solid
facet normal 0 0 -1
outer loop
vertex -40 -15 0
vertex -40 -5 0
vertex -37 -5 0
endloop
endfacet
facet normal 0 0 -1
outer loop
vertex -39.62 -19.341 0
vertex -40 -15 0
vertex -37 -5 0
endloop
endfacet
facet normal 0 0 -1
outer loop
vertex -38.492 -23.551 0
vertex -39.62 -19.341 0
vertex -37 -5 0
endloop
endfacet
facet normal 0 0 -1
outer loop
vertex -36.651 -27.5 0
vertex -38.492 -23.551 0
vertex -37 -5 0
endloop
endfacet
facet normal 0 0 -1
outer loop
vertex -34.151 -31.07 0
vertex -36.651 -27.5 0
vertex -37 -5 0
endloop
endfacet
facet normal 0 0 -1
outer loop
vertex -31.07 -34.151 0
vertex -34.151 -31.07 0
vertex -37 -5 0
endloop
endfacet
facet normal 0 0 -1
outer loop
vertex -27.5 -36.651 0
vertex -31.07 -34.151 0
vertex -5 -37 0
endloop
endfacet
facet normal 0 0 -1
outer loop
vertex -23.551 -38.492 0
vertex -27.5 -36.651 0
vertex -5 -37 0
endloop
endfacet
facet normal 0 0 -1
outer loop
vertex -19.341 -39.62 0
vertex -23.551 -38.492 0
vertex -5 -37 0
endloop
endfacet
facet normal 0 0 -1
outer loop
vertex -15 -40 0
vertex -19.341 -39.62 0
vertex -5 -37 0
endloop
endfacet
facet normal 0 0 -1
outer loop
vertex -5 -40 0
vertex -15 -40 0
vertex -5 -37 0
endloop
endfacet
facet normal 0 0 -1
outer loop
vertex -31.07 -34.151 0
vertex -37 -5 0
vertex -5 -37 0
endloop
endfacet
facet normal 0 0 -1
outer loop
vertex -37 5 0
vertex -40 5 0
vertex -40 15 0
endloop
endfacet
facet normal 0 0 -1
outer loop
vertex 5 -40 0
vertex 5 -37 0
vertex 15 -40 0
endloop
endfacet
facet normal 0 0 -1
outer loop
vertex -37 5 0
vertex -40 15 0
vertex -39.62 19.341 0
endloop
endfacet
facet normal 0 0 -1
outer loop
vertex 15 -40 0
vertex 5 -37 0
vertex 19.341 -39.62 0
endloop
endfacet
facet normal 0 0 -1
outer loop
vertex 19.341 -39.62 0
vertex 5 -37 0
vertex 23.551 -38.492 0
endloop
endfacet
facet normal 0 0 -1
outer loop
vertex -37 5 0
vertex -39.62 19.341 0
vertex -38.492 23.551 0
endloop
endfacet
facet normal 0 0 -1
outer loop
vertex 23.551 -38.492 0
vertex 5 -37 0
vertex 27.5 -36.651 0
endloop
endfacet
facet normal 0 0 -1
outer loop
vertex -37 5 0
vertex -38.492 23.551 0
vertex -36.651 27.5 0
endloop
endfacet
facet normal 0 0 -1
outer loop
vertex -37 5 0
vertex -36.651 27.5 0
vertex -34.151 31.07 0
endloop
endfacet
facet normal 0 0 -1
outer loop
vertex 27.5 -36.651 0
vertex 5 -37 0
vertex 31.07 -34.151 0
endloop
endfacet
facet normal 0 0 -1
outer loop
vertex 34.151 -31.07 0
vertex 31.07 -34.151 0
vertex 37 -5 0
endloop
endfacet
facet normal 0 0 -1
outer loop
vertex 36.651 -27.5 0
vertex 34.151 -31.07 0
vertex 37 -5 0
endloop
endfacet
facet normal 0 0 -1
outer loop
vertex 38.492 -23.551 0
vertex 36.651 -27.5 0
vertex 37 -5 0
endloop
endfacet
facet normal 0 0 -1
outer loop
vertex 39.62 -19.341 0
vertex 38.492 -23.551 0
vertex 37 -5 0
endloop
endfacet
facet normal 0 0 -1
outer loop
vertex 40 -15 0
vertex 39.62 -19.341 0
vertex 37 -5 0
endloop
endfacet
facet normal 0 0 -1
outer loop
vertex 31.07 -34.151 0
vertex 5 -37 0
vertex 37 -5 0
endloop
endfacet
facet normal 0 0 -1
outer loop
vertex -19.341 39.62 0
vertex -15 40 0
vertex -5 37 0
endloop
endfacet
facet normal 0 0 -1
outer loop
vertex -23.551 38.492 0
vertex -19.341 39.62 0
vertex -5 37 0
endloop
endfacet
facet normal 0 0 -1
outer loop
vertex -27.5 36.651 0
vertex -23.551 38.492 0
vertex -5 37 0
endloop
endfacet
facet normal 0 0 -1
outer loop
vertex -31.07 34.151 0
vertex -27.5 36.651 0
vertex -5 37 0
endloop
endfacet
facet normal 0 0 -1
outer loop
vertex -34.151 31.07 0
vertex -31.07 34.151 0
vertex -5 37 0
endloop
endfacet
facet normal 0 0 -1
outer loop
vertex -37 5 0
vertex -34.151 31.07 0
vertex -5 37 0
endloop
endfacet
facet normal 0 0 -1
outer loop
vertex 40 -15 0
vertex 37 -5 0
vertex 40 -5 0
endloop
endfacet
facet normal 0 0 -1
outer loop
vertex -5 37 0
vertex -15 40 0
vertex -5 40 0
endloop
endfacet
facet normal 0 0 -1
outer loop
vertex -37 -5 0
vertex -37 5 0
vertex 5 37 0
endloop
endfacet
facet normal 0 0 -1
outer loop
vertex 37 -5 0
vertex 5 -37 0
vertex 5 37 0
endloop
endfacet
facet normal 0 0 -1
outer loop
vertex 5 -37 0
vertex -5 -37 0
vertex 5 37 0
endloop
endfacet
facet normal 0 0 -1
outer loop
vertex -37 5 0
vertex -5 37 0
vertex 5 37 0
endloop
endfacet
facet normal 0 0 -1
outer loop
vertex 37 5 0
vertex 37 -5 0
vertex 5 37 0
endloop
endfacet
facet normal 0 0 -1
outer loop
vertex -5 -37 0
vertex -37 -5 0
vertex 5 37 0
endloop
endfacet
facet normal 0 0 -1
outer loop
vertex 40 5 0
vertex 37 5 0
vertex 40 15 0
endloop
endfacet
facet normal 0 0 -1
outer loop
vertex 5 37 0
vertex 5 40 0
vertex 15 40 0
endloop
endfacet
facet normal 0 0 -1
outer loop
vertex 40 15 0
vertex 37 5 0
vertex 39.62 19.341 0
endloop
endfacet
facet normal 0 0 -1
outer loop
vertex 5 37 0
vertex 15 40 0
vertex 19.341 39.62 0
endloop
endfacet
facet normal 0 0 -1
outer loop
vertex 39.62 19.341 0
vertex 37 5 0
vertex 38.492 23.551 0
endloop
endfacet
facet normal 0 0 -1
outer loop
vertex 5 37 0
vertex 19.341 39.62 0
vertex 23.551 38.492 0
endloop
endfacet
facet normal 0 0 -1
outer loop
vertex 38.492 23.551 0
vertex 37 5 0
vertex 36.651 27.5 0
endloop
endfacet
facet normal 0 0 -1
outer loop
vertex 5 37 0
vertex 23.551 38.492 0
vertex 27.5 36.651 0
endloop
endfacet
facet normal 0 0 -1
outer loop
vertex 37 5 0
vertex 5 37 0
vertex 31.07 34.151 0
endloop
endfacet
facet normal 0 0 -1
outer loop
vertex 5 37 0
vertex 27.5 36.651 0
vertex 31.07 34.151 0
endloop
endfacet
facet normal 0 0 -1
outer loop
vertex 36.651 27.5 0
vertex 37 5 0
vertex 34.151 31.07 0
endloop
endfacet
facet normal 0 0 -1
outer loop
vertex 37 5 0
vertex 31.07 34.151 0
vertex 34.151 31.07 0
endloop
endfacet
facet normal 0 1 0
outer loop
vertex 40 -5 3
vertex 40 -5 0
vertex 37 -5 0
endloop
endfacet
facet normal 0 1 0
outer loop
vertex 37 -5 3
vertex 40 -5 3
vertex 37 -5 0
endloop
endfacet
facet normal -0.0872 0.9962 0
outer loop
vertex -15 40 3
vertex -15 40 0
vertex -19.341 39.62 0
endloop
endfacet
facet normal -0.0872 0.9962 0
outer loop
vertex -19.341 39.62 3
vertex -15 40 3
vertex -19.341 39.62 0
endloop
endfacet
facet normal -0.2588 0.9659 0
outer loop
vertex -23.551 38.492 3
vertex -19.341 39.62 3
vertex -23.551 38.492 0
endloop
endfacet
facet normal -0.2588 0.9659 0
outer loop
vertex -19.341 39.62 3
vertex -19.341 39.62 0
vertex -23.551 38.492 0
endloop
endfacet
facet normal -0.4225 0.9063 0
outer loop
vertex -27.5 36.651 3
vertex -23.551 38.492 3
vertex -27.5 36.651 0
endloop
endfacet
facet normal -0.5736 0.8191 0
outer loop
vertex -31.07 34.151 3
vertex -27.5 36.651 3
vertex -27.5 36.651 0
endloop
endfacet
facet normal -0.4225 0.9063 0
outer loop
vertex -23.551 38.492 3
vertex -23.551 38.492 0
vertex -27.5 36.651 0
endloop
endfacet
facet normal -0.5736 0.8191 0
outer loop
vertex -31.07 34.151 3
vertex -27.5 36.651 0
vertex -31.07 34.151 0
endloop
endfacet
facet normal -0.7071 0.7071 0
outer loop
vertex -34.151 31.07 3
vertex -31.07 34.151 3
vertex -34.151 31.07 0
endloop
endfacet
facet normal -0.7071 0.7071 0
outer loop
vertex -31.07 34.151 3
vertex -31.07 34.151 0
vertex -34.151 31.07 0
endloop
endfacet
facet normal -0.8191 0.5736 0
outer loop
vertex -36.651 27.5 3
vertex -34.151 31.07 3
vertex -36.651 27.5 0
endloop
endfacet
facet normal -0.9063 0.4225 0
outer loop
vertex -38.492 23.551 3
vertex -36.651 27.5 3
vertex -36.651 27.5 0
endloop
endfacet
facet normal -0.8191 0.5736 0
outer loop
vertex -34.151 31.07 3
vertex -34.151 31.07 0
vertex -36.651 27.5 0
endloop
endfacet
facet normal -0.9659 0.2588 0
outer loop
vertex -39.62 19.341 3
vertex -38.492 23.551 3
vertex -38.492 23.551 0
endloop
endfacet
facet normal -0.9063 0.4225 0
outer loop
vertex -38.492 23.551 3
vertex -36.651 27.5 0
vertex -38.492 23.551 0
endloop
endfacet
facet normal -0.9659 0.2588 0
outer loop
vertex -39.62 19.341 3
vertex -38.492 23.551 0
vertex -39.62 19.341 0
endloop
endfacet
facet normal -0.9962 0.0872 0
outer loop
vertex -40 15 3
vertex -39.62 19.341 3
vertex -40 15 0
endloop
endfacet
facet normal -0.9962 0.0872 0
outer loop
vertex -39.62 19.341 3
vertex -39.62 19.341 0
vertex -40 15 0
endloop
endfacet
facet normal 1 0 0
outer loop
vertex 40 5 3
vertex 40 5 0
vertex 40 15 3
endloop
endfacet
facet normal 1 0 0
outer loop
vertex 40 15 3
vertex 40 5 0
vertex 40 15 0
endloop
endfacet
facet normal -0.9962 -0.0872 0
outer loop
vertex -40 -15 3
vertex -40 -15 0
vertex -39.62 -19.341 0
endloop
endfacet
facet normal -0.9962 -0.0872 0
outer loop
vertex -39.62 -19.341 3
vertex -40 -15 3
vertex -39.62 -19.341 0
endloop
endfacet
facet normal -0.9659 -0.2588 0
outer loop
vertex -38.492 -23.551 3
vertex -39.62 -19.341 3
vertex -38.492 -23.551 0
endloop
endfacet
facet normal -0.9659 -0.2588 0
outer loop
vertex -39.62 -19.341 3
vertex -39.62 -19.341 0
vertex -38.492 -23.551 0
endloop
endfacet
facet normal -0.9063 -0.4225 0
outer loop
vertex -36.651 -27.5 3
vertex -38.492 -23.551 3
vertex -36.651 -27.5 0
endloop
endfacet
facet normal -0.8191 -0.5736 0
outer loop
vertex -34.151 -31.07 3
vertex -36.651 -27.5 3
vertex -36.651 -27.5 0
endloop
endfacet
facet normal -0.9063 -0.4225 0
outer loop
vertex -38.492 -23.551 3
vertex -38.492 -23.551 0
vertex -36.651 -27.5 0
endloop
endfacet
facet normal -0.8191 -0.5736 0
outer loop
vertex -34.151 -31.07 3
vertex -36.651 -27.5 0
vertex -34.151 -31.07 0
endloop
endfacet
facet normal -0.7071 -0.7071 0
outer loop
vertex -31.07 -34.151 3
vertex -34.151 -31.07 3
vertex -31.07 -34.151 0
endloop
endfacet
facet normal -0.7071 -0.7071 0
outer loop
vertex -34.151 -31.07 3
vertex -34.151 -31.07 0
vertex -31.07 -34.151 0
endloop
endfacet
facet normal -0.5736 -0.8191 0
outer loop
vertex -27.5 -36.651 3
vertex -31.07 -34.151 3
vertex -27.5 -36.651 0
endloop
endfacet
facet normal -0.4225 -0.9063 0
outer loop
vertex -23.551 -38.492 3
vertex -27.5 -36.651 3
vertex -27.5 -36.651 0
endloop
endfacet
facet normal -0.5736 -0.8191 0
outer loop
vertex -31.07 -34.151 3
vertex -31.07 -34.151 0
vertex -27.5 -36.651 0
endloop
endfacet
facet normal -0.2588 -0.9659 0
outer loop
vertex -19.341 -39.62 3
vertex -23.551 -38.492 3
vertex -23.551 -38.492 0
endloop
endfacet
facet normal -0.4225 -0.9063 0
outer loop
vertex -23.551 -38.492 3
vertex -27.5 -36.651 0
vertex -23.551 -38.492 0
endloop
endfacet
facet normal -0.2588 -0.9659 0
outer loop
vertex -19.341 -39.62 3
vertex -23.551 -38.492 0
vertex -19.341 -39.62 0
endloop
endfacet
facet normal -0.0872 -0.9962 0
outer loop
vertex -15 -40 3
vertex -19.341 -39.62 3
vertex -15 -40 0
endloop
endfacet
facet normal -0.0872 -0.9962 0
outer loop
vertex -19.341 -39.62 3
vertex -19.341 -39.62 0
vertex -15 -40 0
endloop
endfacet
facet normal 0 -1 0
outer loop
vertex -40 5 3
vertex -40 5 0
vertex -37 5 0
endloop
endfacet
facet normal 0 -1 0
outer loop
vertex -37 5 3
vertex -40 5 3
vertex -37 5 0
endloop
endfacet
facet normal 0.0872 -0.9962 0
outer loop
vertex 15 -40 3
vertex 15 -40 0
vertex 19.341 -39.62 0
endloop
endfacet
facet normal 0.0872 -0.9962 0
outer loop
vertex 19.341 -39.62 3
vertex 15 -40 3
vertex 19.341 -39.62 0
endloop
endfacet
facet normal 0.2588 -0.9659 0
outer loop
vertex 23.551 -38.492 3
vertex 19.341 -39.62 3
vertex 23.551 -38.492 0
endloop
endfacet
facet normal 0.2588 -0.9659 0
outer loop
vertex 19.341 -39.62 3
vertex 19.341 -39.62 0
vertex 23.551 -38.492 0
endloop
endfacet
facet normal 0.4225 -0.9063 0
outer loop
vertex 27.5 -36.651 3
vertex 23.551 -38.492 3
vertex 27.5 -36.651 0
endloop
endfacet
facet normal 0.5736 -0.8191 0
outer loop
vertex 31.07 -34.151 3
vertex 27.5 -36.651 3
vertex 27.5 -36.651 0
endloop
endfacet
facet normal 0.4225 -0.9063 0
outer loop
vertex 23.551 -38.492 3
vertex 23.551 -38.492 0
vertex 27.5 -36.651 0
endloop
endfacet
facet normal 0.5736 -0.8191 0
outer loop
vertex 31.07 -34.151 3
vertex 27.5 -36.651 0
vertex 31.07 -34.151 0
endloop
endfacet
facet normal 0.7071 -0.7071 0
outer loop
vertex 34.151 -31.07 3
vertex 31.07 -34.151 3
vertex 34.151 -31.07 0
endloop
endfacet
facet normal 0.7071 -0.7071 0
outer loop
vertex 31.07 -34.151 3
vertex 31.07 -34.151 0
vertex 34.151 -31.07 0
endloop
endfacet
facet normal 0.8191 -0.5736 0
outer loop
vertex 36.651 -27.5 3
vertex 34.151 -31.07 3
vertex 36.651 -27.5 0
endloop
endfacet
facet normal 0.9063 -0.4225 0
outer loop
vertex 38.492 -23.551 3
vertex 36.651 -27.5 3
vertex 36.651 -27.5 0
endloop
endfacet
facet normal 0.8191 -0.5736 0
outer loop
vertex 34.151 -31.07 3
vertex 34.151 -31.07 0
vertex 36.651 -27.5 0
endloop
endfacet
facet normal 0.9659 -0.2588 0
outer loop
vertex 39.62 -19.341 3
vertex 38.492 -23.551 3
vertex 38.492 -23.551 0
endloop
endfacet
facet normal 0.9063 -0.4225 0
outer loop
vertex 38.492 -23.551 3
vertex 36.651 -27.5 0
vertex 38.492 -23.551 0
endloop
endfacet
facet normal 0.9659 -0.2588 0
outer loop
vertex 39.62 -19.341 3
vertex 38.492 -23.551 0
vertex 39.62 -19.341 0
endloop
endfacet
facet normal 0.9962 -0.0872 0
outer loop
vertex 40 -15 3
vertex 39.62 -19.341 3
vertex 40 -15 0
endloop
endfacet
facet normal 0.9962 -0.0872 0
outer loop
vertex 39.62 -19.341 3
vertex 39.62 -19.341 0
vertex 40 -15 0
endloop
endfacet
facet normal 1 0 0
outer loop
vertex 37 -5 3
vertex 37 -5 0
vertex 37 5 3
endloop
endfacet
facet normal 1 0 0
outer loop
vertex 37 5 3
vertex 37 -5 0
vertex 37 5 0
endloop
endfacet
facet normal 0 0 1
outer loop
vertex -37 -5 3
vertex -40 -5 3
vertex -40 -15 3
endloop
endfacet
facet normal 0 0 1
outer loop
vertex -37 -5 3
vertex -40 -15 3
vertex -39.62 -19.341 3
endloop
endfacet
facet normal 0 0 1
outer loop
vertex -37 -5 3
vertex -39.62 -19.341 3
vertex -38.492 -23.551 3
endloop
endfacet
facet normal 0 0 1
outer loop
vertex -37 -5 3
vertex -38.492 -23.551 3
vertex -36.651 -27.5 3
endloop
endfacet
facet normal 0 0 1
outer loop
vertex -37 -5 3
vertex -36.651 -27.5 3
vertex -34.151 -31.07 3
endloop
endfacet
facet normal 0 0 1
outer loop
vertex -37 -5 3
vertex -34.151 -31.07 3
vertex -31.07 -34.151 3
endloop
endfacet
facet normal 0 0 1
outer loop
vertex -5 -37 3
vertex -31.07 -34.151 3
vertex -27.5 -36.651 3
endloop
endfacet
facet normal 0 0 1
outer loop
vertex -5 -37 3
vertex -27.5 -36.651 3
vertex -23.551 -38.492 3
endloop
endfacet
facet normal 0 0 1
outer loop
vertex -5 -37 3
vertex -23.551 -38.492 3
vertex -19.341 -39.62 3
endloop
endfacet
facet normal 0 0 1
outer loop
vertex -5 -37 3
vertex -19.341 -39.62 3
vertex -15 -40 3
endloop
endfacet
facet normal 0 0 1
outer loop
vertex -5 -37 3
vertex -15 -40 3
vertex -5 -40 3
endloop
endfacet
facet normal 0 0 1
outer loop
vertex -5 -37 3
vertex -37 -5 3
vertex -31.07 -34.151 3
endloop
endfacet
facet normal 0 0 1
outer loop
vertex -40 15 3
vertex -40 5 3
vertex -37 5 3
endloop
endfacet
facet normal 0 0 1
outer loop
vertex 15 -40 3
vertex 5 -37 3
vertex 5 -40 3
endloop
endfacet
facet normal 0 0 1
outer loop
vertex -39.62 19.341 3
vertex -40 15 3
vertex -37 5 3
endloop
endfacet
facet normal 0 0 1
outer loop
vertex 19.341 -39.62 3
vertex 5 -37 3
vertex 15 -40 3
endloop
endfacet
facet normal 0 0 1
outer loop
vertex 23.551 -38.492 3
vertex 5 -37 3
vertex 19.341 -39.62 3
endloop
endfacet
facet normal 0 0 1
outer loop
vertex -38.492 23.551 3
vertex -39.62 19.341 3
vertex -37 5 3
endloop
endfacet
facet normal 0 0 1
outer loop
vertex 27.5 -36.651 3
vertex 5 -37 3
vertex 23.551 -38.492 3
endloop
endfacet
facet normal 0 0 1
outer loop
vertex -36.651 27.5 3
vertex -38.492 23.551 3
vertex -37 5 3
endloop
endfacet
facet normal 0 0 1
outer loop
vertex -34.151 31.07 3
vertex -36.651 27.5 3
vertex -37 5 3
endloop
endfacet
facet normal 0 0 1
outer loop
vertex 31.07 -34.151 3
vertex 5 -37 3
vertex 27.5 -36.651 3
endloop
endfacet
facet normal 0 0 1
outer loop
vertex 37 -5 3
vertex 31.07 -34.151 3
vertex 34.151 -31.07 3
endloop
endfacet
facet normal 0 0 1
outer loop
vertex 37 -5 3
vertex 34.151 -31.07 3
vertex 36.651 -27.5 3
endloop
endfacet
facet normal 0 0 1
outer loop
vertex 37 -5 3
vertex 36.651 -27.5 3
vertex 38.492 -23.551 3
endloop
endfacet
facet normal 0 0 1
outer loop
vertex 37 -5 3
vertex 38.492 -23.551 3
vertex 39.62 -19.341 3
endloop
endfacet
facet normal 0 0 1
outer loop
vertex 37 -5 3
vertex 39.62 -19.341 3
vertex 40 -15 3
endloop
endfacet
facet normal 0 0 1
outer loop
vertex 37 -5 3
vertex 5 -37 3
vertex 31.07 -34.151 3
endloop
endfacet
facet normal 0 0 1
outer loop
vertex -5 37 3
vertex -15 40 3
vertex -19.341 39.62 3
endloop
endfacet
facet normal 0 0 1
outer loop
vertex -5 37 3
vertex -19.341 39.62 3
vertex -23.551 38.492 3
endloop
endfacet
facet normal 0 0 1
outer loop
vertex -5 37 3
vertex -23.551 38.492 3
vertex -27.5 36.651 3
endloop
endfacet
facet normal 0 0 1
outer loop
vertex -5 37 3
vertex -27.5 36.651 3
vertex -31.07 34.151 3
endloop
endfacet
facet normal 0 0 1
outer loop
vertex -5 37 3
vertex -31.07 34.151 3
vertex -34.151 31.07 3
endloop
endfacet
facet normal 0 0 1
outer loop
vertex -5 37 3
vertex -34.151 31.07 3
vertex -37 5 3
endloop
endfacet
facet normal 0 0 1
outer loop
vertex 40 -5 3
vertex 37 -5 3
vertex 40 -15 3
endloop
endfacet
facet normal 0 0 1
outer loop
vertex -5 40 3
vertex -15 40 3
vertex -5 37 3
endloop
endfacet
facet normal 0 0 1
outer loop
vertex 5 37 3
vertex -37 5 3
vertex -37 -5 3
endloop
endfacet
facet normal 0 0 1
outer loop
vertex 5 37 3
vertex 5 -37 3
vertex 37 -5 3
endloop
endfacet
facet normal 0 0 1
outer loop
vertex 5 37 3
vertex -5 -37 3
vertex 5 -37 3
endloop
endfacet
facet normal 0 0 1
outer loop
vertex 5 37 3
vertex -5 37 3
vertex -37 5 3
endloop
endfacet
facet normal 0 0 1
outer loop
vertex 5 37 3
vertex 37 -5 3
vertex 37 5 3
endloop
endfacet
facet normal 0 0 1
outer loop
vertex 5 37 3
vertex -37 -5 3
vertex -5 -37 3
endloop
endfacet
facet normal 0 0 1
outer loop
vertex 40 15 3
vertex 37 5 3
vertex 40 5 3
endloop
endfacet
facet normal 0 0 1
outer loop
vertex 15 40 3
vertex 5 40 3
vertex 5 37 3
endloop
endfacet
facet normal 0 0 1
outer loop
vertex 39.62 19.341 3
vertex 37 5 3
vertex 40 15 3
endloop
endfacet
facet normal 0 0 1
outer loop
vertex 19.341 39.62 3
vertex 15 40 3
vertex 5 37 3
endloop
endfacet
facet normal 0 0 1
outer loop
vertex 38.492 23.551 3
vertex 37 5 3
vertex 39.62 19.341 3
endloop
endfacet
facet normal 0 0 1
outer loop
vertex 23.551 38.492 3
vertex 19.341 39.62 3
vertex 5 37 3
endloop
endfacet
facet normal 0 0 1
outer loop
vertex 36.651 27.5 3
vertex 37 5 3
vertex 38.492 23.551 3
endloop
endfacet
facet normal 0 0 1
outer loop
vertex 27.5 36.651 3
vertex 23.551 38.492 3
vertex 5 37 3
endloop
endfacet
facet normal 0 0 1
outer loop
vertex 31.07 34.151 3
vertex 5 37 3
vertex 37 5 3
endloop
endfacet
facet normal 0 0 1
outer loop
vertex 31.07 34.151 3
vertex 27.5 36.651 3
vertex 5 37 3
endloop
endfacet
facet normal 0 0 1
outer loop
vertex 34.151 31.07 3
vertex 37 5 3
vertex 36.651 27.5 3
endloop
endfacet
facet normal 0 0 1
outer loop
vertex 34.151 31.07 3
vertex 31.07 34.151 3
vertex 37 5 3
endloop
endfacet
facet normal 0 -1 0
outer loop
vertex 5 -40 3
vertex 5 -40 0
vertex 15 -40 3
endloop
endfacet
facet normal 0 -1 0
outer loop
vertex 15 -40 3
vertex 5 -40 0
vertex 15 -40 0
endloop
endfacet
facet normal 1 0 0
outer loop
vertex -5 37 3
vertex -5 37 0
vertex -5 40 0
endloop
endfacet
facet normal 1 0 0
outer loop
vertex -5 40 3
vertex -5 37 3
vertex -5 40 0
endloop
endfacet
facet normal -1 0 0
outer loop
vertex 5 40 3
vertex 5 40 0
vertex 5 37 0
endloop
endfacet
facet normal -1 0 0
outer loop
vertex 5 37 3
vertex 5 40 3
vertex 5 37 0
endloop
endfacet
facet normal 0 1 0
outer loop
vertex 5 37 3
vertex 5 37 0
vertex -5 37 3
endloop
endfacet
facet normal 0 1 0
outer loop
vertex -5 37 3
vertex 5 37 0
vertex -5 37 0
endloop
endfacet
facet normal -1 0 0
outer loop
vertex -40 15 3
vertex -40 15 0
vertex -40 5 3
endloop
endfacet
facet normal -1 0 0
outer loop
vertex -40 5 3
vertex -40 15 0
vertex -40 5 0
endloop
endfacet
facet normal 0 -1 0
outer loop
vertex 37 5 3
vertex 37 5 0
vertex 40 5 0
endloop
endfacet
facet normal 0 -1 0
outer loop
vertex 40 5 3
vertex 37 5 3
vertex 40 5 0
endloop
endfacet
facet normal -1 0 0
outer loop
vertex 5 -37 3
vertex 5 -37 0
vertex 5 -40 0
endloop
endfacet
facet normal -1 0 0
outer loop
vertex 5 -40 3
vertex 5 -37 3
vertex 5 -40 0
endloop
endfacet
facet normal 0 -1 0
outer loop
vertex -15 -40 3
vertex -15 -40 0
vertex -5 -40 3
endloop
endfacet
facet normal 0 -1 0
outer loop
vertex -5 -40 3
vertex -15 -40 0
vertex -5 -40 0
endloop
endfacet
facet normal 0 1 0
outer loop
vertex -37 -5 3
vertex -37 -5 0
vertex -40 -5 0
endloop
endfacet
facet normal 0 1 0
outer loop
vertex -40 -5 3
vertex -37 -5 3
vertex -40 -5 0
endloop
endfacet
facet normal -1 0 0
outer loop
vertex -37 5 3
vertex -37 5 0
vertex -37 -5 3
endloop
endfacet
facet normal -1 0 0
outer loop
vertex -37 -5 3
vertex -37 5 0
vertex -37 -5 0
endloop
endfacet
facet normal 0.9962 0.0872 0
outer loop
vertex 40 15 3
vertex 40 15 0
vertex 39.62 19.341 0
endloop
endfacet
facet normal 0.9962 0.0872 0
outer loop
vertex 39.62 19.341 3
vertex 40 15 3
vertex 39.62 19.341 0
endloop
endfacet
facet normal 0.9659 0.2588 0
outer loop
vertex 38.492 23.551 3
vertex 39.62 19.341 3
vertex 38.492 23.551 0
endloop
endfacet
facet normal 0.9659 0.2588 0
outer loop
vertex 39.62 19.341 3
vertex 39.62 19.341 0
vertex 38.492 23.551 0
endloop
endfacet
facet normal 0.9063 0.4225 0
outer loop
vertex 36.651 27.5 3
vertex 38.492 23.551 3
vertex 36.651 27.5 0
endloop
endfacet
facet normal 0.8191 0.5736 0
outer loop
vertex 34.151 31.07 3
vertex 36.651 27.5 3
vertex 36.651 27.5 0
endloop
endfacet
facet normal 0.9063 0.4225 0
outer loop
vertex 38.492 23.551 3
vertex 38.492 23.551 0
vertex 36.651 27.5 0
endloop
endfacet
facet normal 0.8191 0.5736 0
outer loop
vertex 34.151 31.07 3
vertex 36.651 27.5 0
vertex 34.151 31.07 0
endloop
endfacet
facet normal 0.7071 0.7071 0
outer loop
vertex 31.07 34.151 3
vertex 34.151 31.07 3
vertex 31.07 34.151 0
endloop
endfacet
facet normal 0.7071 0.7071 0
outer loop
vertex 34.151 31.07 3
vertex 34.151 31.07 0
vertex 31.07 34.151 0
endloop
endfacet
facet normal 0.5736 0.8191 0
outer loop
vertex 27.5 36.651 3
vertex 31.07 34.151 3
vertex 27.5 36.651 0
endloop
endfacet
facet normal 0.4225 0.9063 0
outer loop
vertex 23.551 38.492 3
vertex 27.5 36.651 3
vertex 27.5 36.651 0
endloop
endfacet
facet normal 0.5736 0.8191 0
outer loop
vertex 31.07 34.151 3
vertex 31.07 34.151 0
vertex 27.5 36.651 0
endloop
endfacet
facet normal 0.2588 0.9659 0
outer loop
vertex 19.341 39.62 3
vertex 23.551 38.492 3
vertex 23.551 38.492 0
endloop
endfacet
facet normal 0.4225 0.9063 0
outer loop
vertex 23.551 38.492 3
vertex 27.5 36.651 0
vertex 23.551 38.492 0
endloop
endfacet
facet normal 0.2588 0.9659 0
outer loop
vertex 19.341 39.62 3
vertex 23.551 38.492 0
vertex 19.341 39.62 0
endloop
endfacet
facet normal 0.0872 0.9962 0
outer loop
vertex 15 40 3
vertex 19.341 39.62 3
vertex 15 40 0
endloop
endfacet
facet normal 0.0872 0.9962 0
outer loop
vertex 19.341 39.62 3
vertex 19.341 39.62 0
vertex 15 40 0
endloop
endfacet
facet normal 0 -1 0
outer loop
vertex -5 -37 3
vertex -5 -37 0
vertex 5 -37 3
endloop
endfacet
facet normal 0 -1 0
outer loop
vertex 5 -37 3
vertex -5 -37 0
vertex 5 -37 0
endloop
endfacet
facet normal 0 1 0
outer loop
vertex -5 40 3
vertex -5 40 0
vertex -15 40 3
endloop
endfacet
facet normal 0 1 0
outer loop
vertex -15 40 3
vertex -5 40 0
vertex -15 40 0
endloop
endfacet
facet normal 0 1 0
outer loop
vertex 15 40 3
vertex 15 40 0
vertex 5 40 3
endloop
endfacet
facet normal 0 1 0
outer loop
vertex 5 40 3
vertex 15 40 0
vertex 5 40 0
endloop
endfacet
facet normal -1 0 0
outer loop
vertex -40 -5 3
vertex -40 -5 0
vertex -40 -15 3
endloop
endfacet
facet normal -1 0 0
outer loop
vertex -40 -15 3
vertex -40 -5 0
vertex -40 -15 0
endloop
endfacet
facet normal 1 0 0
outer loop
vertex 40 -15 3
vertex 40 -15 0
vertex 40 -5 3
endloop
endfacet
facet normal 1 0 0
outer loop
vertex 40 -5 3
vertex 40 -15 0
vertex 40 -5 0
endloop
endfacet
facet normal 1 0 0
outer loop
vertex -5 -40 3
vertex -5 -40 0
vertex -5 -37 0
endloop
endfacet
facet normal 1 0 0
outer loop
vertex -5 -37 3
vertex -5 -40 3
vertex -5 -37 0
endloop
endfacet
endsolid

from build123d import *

# Parameters (mm, degrees)
EXTRUDE_1_DEPTH = 3


with BuildPart() as part:
    # 草圖1 → 填料-伸長1 (new body)
    with BuildSketch(Plane.XY):
        with BuildLine():
            Line((-5, 40), (-15, 40))
            ThreePointArc((-15, 40), (-32.67766953, 32.67766953), (-40, 15))
            Line((-40, 15), (-40, 5))
            Line((-40, 5), (-37, 5))
            Line((-37, 5), (-37, -5))
            Line((-37, -5), (-40, -5))
            Line((-40, -5), (-40, -15))
            ThreePointArc((-40, -15), (-32.67766953, -32.67766953), (-15, -40))
            Line((-15, -40), (-5, -40))
            Line((-5, -40), (-5, -37))
            Line((-5, -37), (5, -37))
            Line((5, -37), (5, -40))
            Line((5, -40), (15, -40))
            ThreePointArc((15, -40), (32.67766953, -32.67766953), (40, -15))
            Line((40, -15), (40, -5))
            Line((40, -5), (37, -5))
            Line((37, -5), (37, 5))
            Line((37, 5), (40, 5))
            Line((40, 5), (40, 15))
            ThreePointArc((40, 15), (32.67766953, 32.67766953), (15, 40))
            Line((15, 40), (5, 40))
            Line((5, 40), (5, 37))
            Line((5, 37), (-5, 37))
            Line((-5, 37), (-5, 40))
        make_face()
    extrude(amount=EXTRUDE_1_DEPTH)


solid = part.part
